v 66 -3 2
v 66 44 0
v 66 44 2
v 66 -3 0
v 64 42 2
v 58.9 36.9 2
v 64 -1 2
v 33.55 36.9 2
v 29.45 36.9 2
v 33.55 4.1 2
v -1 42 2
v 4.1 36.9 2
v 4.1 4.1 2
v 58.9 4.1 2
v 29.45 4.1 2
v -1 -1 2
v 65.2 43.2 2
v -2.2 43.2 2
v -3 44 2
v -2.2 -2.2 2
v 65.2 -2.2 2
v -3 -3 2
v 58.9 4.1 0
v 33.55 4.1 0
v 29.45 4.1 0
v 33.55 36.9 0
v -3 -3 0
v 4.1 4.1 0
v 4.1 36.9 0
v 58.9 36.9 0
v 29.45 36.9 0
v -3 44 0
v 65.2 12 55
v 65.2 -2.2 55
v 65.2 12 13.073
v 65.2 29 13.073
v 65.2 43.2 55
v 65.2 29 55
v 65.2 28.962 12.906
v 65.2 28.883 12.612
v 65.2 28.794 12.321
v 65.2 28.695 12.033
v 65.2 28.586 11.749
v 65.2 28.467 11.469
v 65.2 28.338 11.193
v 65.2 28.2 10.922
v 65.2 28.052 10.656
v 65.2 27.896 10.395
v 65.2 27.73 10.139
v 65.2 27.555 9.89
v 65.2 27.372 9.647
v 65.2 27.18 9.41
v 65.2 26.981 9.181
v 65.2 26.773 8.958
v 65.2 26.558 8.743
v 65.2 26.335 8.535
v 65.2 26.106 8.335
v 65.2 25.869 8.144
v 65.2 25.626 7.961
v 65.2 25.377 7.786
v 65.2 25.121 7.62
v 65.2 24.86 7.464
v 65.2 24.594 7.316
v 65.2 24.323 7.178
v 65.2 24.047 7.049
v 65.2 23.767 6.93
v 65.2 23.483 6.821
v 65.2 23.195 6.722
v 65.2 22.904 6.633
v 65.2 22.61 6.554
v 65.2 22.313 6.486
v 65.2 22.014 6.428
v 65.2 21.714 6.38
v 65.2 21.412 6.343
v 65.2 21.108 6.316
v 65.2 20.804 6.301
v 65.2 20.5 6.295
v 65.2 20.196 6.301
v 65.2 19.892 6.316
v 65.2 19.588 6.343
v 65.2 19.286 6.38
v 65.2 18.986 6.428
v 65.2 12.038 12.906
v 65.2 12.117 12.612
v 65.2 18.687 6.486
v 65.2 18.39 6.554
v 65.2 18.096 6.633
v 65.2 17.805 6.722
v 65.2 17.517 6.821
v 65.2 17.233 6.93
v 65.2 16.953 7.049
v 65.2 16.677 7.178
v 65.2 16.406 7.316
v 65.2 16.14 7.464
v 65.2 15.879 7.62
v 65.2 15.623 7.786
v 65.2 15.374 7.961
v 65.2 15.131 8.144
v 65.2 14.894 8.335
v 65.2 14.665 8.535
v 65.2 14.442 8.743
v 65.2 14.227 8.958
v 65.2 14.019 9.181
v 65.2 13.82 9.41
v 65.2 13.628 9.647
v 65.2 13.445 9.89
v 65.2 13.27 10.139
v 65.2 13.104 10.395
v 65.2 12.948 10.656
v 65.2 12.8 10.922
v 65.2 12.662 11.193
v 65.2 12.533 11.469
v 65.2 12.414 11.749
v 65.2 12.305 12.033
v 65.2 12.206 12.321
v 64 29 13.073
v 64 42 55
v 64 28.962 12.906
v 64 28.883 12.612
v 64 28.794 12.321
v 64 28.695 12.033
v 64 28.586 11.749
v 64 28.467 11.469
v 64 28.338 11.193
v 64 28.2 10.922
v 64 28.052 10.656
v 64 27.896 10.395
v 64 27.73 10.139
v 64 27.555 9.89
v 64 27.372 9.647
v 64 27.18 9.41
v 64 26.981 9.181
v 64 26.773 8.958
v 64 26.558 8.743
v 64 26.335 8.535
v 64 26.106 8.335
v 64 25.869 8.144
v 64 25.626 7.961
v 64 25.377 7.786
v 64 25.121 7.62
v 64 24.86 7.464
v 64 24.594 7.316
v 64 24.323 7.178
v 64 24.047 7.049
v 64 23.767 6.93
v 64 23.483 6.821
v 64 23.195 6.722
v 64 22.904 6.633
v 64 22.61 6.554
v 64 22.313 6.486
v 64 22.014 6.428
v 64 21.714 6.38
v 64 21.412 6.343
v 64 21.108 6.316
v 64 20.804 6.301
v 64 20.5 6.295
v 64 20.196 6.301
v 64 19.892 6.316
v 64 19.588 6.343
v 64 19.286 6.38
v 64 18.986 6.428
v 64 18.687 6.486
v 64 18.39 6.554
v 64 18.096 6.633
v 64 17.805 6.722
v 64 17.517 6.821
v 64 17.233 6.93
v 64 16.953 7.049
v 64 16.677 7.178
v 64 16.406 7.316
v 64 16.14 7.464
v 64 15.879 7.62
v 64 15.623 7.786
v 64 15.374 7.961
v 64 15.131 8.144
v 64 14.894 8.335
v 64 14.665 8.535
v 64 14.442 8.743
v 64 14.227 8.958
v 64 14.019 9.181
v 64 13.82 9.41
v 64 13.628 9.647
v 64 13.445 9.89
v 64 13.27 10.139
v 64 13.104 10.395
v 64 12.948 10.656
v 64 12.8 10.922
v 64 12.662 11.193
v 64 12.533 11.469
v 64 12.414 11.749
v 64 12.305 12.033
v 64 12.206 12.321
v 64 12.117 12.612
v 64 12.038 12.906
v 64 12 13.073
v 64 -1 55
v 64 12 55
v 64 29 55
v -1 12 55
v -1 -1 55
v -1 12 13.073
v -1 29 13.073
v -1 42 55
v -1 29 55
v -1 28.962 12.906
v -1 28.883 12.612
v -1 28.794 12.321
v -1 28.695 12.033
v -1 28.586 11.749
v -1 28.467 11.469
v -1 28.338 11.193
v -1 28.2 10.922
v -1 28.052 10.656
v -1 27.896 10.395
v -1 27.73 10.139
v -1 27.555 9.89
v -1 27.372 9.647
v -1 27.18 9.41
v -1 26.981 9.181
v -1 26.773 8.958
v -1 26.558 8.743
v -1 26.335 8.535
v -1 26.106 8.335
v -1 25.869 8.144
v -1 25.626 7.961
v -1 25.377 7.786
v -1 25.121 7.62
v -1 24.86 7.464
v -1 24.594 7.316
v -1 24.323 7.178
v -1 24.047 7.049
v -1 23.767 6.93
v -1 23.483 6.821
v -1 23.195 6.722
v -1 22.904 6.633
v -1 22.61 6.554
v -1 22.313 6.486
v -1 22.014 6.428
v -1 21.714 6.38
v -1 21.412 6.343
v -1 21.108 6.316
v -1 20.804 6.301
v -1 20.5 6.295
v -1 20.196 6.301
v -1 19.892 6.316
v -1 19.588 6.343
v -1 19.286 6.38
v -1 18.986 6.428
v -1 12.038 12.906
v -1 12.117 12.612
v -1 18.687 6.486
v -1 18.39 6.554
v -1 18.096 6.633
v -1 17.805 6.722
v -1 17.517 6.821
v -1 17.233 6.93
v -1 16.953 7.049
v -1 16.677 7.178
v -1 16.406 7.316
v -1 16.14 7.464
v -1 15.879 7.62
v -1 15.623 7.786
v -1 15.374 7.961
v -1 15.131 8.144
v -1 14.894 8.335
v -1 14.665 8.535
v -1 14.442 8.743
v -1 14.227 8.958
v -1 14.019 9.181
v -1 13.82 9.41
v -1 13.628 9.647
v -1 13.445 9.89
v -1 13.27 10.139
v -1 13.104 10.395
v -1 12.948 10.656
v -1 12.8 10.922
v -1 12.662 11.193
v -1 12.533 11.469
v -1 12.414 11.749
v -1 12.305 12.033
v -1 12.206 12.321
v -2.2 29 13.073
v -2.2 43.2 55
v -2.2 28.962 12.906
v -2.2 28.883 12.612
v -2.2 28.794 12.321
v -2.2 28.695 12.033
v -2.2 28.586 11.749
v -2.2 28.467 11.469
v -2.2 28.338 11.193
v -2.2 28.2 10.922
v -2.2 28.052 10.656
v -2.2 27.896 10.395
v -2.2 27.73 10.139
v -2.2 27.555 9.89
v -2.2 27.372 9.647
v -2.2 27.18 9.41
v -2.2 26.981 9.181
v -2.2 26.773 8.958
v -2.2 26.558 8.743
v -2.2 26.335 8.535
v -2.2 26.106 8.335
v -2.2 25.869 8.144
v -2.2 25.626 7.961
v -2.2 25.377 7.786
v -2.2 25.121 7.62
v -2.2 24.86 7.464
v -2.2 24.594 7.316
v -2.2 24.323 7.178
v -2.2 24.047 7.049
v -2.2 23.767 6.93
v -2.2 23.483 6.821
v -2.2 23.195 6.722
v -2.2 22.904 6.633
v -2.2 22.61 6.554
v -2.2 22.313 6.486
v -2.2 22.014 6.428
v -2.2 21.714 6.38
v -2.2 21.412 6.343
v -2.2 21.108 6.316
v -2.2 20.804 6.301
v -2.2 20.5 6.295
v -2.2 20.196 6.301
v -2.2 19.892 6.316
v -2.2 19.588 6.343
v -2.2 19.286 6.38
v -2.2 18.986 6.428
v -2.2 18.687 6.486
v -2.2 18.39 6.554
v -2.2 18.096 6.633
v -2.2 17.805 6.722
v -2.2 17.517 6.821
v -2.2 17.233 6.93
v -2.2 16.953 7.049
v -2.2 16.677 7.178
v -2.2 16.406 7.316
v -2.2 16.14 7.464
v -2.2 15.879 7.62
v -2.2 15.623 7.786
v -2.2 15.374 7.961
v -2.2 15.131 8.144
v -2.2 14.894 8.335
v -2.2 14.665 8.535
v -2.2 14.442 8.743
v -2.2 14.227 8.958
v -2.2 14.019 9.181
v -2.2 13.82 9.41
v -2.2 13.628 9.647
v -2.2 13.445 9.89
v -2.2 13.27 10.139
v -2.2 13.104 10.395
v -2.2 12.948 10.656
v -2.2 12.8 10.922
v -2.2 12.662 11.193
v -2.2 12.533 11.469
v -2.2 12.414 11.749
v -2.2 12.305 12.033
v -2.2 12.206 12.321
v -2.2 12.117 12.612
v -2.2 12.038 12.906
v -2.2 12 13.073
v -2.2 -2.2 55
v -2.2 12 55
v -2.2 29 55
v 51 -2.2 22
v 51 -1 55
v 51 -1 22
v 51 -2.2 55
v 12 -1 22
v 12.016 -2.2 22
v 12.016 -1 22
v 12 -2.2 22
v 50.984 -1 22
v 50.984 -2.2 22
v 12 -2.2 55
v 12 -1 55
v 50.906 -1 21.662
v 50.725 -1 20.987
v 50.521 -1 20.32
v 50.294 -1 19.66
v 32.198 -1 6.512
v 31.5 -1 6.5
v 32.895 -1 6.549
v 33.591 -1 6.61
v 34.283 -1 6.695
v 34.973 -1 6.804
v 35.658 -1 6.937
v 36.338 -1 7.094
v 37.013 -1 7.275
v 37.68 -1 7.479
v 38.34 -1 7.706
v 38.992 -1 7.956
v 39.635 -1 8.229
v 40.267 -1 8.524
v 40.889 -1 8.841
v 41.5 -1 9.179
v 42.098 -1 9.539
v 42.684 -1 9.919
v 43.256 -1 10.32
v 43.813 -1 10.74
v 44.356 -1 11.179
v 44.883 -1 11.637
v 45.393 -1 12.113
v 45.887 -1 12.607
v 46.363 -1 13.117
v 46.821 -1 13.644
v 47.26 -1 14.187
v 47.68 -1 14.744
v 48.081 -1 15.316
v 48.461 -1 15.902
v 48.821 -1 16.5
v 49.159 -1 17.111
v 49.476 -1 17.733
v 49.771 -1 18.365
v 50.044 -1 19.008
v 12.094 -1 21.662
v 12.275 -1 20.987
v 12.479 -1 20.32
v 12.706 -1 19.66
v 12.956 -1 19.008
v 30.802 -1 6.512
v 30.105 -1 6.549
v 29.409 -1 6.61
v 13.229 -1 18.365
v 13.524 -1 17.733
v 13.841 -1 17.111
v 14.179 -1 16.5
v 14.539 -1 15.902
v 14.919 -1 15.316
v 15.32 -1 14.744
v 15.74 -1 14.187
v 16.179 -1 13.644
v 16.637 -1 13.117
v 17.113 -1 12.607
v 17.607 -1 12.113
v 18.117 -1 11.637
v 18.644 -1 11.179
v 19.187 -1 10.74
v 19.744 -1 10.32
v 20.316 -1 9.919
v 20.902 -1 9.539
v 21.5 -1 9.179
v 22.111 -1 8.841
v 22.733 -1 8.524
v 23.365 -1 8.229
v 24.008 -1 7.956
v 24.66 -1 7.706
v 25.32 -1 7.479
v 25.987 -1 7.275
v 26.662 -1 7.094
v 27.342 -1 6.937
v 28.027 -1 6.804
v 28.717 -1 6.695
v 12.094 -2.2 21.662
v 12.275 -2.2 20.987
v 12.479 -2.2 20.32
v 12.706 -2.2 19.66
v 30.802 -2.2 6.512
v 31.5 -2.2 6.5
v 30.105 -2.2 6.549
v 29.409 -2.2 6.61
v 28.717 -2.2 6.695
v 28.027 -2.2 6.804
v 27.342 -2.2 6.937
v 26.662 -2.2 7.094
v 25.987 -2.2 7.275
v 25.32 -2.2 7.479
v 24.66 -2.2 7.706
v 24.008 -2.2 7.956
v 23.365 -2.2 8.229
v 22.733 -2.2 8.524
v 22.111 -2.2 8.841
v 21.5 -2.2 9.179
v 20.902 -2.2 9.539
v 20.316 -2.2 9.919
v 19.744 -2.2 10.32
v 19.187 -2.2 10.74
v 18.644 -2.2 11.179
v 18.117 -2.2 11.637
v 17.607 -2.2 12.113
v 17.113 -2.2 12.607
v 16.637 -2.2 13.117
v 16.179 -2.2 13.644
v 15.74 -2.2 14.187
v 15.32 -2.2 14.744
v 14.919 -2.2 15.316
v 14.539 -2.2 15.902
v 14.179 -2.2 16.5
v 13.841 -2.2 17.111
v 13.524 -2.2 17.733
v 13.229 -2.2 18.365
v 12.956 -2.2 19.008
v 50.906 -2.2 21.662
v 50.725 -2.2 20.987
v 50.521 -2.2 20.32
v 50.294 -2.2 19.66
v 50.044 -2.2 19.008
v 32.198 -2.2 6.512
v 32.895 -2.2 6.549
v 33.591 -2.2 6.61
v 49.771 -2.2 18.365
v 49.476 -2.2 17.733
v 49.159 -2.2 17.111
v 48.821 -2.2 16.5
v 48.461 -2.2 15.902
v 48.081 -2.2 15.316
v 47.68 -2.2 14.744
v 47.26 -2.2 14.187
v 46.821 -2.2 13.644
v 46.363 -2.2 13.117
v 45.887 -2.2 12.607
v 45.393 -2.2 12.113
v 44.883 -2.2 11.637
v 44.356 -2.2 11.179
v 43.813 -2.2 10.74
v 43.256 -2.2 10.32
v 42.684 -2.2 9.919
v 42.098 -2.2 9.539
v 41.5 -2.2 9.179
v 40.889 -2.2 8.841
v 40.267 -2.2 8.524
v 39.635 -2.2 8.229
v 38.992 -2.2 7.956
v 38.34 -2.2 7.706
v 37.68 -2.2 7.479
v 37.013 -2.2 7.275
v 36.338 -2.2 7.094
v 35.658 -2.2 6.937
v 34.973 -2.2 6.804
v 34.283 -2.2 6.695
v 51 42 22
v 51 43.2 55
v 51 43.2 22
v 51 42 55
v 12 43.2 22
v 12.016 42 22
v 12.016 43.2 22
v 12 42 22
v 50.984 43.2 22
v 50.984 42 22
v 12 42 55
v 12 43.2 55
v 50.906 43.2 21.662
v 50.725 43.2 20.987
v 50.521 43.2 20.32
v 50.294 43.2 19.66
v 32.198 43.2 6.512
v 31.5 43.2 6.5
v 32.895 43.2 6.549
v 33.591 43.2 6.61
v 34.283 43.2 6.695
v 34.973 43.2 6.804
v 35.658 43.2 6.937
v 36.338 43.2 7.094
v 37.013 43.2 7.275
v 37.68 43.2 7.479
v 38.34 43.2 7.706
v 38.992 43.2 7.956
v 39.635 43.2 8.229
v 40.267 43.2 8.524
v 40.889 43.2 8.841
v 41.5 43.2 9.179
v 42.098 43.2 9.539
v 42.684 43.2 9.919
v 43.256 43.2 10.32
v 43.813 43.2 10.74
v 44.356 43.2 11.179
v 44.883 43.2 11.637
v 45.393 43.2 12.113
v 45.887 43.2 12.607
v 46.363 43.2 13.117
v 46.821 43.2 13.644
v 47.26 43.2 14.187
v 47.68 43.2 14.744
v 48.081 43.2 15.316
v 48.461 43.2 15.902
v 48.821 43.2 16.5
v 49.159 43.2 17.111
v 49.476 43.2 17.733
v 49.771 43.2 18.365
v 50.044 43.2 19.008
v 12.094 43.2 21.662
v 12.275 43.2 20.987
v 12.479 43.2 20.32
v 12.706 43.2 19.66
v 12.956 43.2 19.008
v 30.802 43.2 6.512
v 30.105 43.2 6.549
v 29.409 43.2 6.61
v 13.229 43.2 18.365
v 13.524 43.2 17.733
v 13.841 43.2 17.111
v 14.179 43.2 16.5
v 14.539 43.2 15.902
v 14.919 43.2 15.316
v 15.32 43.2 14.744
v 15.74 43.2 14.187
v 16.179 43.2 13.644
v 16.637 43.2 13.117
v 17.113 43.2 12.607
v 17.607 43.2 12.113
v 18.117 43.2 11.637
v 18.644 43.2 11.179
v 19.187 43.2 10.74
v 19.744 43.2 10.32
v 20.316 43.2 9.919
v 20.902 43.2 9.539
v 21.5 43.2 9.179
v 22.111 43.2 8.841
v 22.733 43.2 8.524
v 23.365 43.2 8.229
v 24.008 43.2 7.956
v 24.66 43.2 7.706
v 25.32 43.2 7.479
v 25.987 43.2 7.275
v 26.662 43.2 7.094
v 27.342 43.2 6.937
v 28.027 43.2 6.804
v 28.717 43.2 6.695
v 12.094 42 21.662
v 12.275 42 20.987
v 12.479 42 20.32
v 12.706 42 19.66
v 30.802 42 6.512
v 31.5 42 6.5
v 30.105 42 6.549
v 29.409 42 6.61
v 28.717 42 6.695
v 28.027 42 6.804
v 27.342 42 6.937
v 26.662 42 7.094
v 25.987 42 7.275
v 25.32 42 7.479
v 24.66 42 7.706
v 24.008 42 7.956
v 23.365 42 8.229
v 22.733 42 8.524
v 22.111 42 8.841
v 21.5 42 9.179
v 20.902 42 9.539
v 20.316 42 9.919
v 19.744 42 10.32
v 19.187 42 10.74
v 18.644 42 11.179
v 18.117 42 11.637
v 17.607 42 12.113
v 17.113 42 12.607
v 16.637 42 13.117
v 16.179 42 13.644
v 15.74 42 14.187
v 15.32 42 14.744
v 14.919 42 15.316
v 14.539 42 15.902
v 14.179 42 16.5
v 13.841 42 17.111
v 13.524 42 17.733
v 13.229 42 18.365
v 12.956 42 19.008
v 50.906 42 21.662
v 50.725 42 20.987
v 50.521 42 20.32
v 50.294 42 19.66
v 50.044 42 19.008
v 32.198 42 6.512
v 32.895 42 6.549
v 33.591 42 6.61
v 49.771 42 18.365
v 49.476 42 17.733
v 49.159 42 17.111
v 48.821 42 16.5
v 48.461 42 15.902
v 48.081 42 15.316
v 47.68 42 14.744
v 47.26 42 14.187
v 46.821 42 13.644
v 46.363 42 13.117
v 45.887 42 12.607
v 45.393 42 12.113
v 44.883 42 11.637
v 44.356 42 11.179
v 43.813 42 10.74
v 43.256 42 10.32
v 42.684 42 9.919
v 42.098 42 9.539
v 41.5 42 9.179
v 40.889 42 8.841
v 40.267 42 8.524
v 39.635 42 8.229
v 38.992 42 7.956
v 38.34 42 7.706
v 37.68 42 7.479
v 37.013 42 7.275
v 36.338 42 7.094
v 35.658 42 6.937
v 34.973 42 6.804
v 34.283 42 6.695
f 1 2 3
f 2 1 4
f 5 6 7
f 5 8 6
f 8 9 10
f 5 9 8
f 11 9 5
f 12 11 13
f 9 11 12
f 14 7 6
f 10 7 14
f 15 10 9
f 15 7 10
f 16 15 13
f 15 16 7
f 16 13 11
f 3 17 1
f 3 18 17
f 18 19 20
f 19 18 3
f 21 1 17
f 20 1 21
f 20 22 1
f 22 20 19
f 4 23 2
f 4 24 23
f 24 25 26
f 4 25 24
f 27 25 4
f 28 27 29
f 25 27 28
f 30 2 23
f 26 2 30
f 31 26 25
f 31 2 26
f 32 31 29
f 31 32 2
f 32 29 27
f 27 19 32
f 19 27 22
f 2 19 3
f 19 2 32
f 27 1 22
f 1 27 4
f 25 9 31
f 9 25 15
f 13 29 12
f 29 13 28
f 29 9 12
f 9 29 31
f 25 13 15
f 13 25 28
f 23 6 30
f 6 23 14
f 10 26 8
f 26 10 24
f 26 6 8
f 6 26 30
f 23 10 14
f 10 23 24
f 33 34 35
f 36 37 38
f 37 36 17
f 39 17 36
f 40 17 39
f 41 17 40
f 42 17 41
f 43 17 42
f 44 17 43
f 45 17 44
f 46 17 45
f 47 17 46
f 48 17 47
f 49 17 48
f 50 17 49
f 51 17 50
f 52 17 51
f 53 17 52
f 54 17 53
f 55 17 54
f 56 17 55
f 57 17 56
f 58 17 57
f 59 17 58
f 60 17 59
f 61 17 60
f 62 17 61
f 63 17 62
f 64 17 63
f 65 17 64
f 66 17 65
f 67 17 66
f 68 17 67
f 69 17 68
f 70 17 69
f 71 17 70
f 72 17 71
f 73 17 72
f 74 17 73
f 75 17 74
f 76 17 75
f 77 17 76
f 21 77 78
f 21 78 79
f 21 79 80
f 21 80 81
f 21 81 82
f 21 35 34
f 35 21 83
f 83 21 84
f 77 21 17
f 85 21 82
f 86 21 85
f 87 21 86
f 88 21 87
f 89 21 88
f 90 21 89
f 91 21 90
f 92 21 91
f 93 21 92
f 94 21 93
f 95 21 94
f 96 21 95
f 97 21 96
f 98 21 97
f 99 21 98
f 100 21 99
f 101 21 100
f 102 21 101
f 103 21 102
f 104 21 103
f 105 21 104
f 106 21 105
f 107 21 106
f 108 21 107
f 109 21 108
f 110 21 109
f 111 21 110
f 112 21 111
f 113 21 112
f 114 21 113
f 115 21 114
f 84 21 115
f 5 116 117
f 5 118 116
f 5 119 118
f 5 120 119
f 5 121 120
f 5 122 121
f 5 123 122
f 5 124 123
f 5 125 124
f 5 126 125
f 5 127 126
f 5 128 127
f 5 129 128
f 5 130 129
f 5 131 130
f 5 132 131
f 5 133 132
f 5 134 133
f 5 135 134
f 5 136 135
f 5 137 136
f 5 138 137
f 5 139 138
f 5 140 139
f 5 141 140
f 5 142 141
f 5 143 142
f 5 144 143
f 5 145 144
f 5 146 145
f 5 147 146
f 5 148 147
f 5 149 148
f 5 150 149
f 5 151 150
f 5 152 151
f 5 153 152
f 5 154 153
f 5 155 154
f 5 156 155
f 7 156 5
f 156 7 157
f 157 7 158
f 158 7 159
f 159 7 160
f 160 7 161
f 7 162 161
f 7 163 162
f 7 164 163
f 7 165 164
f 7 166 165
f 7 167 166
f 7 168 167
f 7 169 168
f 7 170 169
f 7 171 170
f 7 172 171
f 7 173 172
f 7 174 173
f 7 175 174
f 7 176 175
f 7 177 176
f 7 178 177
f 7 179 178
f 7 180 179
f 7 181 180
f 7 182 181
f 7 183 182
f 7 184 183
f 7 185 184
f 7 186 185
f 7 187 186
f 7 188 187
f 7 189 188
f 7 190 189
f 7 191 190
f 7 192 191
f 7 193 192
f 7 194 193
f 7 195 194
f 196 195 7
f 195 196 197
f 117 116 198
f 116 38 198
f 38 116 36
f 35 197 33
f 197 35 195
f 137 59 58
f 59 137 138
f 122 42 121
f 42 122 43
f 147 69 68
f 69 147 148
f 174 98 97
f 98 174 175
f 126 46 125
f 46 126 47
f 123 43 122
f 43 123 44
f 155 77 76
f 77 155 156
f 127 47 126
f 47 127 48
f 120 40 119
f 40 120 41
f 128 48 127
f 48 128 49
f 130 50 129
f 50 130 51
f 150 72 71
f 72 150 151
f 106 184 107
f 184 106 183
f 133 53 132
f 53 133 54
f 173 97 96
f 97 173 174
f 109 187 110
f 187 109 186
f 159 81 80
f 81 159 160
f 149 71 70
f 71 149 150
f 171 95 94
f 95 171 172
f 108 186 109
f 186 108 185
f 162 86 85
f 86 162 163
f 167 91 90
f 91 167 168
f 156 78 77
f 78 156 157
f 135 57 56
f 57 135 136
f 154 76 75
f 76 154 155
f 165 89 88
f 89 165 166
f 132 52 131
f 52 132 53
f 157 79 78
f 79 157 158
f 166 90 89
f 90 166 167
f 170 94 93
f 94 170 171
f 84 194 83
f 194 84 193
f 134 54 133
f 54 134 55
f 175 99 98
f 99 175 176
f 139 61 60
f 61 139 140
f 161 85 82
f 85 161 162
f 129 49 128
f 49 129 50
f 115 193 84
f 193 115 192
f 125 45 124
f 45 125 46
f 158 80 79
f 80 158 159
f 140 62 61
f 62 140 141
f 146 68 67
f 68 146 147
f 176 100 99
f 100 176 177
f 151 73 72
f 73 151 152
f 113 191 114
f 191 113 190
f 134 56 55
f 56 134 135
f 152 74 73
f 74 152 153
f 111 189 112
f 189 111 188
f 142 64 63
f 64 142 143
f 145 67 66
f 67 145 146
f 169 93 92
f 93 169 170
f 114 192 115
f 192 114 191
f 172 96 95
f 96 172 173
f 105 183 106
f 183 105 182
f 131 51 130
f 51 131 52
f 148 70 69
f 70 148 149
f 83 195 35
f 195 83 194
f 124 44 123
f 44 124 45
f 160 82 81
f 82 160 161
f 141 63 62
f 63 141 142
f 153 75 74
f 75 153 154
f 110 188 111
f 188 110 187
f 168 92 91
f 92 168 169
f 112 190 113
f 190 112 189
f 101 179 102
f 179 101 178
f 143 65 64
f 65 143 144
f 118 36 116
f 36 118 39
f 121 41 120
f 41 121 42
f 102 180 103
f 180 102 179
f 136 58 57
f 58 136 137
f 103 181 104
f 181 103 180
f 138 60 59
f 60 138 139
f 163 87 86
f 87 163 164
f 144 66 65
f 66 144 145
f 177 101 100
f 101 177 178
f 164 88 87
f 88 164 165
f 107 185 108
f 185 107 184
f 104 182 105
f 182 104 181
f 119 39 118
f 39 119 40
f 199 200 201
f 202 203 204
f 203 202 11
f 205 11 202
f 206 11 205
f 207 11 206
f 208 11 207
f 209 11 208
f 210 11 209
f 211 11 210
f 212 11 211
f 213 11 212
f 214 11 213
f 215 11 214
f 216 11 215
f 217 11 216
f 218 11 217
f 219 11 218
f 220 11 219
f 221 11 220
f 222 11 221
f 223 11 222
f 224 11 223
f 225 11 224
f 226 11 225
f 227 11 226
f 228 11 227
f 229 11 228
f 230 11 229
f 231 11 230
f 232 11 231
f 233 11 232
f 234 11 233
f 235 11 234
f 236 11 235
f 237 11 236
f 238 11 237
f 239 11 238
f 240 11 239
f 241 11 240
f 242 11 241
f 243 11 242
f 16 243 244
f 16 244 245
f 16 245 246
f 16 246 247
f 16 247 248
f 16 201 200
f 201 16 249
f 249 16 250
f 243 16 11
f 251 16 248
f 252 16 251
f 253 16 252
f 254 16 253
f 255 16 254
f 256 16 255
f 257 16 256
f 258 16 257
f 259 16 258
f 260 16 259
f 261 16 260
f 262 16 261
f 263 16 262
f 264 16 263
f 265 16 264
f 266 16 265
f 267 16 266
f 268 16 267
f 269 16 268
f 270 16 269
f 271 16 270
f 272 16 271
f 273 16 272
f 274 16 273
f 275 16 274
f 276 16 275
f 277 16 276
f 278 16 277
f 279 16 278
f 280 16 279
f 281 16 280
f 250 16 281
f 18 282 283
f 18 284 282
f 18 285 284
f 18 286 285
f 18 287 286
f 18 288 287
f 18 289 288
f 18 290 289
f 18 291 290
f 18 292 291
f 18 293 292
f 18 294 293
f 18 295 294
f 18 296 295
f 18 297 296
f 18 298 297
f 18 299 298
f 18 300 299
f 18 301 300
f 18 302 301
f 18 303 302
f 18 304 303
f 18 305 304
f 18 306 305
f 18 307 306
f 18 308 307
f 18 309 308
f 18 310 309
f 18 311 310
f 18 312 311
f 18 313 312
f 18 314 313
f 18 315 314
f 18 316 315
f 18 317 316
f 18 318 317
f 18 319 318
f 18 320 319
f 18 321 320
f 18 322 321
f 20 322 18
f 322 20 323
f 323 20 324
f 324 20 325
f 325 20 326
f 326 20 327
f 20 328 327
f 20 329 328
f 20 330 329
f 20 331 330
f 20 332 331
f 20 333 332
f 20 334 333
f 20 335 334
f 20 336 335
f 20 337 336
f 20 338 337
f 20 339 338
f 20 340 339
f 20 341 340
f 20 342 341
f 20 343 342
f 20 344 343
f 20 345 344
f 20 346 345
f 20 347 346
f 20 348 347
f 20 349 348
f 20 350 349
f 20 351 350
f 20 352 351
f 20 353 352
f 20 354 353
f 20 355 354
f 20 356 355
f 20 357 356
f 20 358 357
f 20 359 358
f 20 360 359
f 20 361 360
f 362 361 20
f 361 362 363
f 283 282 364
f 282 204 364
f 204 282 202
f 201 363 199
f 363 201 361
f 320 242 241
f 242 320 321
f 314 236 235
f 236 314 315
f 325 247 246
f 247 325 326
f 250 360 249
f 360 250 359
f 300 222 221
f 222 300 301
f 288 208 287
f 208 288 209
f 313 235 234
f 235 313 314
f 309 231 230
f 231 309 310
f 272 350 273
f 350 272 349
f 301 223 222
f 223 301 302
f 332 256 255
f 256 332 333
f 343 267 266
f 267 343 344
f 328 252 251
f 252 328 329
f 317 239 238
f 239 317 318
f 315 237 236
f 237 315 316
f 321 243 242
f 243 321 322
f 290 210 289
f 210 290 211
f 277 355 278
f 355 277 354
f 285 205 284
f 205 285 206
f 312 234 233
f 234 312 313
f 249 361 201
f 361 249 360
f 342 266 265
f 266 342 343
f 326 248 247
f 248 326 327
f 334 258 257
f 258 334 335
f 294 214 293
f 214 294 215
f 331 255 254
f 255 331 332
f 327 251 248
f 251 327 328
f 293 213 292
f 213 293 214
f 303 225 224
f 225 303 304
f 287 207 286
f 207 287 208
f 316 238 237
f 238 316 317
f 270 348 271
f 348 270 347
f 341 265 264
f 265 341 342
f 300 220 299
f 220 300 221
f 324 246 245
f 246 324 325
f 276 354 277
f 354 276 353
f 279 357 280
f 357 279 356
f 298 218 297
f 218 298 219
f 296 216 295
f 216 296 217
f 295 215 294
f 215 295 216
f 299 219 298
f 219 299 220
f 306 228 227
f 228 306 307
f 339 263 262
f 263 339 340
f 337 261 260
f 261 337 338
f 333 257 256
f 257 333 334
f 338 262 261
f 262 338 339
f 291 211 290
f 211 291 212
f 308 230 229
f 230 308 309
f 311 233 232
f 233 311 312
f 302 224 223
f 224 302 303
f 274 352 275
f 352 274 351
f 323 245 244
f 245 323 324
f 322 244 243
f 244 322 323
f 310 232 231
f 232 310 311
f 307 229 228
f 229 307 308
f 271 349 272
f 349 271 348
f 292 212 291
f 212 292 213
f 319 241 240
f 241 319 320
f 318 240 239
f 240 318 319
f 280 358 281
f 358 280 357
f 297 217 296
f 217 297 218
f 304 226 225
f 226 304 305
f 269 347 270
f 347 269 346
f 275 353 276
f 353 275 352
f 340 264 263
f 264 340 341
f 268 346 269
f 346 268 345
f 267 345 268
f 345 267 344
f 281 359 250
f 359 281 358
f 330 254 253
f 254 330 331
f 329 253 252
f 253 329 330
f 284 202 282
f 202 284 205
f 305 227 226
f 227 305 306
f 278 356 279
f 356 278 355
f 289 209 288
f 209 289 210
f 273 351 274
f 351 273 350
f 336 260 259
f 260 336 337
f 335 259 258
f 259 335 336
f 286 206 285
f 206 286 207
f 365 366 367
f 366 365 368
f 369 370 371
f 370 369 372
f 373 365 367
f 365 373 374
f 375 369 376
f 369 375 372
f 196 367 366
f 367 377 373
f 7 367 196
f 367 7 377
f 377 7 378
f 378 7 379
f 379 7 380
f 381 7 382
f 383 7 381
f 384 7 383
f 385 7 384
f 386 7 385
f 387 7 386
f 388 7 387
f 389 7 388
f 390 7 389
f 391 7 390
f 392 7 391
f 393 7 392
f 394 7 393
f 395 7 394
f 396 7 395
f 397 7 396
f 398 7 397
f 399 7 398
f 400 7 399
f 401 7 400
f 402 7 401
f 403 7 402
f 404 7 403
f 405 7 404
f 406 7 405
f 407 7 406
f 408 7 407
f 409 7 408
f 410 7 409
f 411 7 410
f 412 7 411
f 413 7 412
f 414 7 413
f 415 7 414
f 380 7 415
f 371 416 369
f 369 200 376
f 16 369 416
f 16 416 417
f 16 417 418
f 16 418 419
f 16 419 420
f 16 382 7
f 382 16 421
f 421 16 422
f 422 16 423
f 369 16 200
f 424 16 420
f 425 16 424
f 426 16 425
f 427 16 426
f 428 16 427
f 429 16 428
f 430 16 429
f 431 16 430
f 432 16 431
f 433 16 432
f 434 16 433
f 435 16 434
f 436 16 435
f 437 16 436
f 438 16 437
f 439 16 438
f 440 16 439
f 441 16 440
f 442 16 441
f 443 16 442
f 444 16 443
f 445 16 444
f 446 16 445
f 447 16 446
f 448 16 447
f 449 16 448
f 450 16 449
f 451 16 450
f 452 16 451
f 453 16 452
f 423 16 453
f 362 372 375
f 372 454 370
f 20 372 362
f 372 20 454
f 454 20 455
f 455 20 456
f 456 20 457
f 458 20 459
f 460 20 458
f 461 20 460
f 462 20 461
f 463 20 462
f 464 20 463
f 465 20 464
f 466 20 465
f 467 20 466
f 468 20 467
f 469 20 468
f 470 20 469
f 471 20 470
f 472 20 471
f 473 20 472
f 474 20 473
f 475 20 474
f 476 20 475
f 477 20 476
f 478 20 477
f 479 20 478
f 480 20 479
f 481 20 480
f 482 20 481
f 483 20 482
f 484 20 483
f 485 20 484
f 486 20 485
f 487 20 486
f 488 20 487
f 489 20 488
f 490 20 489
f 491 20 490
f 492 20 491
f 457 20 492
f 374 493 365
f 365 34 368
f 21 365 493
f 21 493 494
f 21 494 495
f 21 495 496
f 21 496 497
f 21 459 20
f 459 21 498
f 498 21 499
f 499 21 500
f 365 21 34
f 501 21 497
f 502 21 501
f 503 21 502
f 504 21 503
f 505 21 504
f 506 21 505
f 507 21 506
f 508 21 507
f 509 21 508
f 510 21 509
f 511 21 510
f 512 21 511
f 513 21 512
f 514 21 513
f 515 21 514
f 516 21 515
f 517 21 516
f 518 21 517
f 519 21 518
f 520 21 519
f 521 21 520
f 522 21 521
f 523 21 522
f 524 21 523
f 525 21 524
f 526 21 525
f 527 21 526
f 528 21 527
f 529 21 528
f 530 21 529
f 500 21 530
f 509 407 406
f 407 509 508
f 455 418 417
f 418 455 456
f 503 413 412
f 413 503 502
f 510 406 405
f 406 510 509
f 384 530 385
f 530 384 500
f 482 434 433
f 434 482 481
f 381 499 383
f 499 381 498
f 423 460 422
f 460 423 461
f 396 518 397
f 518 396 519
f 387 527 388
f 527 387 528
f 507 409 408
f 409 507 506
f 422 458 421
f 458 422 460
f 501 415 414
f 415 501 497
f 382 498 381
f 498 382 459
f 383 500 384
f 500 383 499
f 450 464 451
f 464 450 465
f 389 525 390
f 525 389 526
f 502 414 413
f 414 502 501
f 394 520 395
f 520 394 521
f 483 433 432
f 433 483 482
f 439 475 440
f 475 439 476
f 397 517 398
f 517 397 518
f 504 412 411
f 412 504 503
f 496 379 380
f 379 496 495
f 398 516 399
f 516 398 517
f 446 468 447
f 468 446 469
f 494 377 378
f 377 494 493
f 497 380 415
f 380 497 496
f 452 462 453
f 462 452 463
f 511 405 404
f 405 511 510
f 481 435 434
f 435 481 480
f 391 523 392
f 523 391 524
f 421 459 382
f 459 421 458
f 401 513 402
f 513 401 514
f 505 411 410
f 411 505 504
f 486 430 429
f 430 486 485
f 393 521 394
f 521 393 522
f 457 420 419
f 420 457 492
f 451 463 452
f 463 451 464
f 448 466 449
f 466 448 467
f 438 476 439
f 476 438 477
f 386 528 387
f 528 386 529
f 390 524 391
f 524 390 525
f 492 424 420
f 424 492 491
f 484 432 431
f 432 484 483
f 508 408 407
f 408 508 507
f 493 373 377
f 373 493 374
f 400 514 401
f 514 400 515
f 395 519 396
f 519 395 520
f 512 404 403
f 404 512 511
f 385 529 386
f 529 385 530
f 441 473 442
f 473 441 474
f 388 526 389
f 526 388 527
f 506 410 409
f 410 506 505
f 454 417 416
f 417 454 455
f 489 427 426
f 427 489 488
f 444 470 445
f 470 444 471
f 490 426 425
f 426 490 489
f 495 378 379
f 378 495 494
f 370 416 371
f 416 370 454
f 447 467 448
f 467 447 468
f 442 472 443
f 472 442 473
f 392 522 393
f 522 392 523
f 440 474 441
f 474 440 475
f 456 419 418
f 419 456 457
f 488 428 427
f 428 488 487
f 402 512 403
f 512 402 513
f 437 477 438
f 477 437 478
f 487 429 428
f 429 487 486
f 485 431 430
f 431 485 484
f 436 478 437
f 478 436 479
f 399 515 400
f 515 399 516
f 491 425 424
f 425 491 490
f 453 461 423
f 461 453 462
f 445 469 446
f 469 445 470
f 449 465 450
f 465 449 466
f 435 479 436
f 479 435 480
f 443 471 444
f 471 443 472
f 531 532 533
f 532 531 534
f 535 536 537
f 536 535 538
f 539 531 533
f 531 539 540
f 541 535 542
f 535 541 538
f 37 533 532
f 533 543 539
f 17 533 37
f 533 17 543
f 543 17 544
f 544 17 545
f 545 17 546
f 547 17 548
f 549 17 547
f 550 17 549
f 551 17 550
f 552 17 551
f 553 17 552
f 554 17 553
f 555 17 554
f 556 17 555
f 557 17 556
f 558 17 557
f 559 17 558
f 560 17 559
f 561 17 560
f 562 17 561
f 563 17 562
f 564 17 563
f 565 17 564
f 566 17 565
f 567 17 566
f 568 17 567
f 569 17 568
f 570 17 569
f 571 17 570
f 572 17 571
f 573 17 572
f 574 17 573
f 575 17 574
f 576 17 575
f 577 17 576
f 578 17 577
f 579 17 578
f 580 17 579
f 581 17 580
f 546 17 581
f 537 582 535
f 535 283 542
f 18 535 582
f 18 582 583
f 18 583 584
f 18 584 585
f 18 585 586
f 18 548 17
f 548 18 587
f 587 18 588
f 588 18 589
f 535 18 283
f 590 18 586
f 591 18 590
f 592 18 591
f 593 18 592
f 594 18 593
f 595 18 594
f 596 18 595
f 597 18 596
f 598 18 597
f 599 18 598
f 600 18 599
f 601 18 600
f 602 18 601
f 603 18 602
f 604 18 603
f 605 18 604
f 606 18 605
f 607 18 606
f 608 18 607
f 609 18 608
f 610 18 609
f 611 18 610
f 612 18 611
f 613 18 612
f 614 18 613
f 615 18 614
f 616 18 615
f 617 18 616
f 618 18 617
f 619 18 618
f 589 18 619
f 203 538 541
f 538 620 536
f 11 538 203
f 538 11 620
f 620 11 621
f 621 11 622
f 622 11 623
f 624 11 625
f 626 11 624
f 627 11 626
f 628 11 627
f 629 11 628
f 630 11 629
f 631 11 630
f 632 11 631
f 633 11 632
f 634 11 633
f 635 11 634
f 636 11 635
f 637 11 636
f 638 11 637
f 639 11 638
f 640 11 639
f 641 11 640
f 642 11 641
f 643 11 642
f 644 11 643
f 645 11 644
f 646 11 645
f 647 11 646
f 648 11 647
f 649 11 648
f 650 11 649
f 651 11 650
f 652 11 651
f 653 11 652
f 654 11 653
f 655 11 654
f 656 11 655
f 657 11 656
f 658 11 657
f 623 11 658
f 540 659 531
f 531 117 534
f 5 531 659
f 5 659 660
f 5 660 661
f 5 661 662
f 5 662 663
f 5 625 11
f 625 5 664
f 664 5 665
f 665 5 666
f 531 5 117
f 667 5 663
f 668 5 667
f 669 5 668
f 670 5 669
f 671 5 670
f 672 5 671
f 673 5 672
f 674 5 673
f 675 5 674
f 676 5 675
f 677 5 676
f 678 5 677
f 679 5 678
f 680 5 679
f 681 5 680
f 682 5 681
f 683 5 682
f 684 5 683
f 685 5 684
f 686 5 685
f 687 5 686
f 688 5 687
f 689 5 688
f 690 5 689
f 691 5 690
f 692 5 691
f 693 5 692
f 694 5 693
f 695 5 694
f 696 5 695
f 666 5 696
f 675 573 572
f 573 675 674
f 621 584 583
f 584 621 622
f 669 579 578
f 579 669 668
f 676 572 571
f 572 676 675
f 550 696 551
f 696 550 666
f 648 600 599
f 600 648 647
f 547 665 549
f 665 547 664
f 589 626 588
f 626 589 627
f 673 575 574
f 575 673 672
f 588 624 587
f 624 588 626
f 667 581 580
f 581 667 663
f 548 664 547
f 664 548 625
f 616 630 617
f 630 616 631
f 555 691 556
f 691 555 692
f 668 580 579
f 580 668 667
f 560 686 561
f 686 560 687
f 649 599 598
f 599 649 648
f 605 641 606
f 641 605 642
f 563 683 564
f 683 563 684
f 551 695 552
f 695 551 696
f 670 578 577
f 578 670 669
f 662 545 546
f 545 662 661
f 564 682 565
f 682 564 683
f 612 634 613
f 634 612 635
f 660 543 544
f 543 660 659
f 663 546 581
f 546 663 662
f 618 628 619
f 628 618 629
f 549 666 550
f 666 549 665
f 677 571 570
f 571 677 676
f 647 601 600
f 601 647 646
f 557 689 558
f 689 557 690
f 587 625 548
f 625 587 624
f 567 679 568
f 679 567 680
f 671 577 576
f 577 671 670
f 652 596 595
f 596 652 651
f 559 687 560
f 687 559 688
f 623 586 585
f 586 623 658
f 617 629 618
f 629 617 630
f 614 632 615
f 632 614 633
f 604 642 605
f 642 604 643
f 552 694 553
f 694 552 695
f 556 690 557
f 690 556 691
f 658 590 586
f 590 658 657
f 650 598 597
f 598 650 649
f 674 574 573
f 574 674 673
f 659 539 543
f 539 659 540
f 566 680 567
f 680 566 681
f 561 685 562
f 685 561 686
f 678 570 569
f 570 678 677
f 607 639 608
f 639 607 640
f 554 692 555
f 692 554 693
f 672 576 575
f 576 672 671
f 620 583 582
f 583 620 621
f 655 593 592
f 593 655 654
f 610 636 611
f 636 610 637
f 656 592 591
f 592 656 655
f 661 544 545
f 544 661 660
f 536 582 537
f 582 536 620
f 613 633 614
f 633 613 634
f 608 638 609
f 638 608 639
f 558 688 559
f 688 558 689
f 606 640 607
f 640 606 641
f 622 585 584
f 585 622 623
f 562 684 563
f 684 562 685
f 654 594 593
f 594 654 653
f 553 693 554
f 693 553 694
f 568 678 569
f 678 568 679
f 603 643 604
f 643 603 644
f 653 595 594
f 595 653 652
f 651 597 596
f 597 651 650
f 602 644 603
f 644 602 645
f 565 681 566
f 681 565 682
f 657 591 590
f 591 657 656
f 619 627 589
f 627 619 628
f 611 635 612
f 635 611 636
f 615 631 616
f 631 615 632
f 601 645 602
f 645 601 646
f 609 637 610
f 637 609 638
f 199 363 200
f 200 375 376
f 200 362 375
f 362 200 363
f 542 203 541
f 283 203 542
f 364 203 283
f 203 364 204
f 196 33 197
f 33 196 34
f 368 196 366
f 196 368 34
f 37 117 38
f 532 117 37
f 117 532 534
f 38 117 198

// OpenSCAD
// Card Holder

// Card Length
CardLength = 63;

// Card Width
CardWidth = 41;

// Tolerance
Tolerance = 1;

// Size Of Nozzle
SizeOfNozzle = 0.4;

// Outside Skirt
OutsideSkirt = 2;

// Wall Thickness In Layers
WallThicknessInLayers = 3;

// Wall Height
WallHeight = 53;

// Wall Length
WallLength = 13;

// BottomThickness
BottomThickness = 2;

// Cut Out Percentage
CutOutPercentage = 80;

// Length Support
SupportHeight = 20;
HoleRadiusChange = 0.5;
HoleOffset = 4.5;

// Width Support (change Length Support first!)
WidthRadiusChange = 0.67; // percentage as a fraction
WidthOffset = -4.5;
WidthHeightChange = -7;



WallThickness = WallThicknessInLayers * SizeOfNozzle;
Rim = CardWidth * ((100 - CutOutPercentage) / 2) / 100;
CutOutLength = (CardLength - 3 * Rim) / 2;
CutOutWidth = CardWidth * CutOutPercentage / 100;
HoleRadius = (CardLength - 2 * WallLength + 2* Tolerance)/2 + HoleRadiusChange;
WidthRatio = CardWidth/CardLength;



// Bottom Layer
difference(){
	translate([	0 - Tolerance - OutsideSkirt,
					0 - Tolerance - OutsideSkirt,
					0])
	cube(size = [	CardLength + 2 * (Tolerance + OutsideSkirt),
						CardWidth + 2 * (Tolerance + OutsideSkirt),
						BottomThickness]);

	// Cut Out
	translate([	0 + Rim,0 + Rim,0])
	cube(size = [	CutOutLength,
						CutOutWidth,
						BottomThickness]);

	translate([	0 + 2 * Rim + CutOutLength,0 + Rim,0])
	cube(size = [	CutOutLength,
						CutOutWidth,
						BottomThickness]);

}


// Walls(LL)

	translate([	0 - Tolerance - WallThickness,
					0 - Tolerance - WallThickness,
				   BottomThickness])
	cube(size = [	WallThickness,
						WallThickness + WallLength,
						WallHeight]);

	translate([	0 - Tolerance - WallThickness,
					0 - Tolerance - WallThickness,
				   BottomThickness])
	cube(size = [	WallThickness + WallLength,
						WallThickness,
						WallHeight]);


// Walls(UL)

	translate([	0 - Tolerance - WallThickness,
					CardWidth + Tolerance - WallLength,
				   BottomThickness])
	cube(size = [	WallThickness,
						WallThickness + WallLength,
						WallHeight]);

	translate([	0 - Tolerance - WallThickness,
					CardWidth + Tolerance,
				   BottomThickness])
	cube(size = [	WallThickness + WallLength,
						WallThickness,
						WallHeight]);
    
    
// Walls(LR)

	translate([	CardLength + Tolerance - WallLength,
					0 - Tolerance - WallThickness,
				   BottomThickness])
	cube(size = [	WallThickness + WallLength,
						WallThickness,
						WallHeight]);

	translate([	CardLength + Tolerance,
					0 - Tolerance - WallThickness,
				   BottomThickness])
	cube(size = [	WallThickness,
						WallThickness + WallLength,
						WallHeight]);

// Walls(UR)

	translate([	CardLength + Tolerance - WallLength,
					CardWidth + Tolerance,
				   BottomThickness])
	cube(size = [	WallThickness + WallLength,
						WallThickness,
						WallHeight]);

	translate([	CardLength + Tolerance,
					CardWidth + Tolerance - WallLength,
				   BottomThickness])
	cube(size = [	WallThickness,
						WallThickness + WallLength,
						WallHeight]);
                        
 // Width Support

    difference() {    
        translate([	CardLength + Tolerance, WallLength - Tolerance, BottomThickness]) cube(size = [WallThickness, CardWidth+2*Tolerance-2*WallLength, SupportHeight+WidthHeightChange]);
        translate([CardLength + Tolerance, (CardWidth)/2, (SupportHeight*WidthRatio+BottomThickness+HoleOffset)+WidthOffset]) rotate([0, 90, 0]) cylinder($fn=180, WallThickness, HoleRadius*WidthRatio*WidthRadiusChange, HoleRadius*WidthRatio*WidthRadiusChange, false);
    }
    
    difference() {    
        translate([	0 - WallThickness - Tolerance, WallLength - Tolerance, BottomThickness]) cube(size = [WallThickness, CardWidth+2*Tolerance-2*WallLength, SupportHeight+WidthHeightChange]);
        translate([0 - WallThickness - Tolerance, (CardWidth)/2, (SupportHeight*WidthRatio+BottomThickness+HoleOffset)+WidthOffset]) rotate([0, 90, 0]) cylinder($fn=180, WallThickness, HoleRadius*WidthRatio*WidthRadiusChange, HoleRadius*WidthRatio*WidthRadiusChange, false);
    }
                        
// Length Support
    
    difference() {    
        translate([	WallLength - Tolerance, 0 - Tolerance - WallThickness, BottomThickness]) cube(size = [CardLength - 2 * WallLength + 2* Tolerance, WallThickness, SupportHeight]);
        translate([CardLength/2, 0-Tolerance, SupportHeight+BottomThickness+HoleOffset]) rotate([90, 0, 0]) cylinder($fn=180, WallThickness, HoleRadius, HoleRadius, false);
    }
    
    difference() {    
        translate([	WallLength - Tolerance, CardWidth+Tolerance, BottomThickness]) cube(size = [CardLength - 2 * WallLength + 2* Tolerance, WallThickness, SupportHeight]);
        translate([CardLength/2, CardWidth+Tolerance+WallThickness, SupportHeight+BottomThickness+HoleOffset]) rotate([90, 0, 0]) cylinder($fn=180, WallThickness, HoleRadius, HoleRadius, false);
    }
